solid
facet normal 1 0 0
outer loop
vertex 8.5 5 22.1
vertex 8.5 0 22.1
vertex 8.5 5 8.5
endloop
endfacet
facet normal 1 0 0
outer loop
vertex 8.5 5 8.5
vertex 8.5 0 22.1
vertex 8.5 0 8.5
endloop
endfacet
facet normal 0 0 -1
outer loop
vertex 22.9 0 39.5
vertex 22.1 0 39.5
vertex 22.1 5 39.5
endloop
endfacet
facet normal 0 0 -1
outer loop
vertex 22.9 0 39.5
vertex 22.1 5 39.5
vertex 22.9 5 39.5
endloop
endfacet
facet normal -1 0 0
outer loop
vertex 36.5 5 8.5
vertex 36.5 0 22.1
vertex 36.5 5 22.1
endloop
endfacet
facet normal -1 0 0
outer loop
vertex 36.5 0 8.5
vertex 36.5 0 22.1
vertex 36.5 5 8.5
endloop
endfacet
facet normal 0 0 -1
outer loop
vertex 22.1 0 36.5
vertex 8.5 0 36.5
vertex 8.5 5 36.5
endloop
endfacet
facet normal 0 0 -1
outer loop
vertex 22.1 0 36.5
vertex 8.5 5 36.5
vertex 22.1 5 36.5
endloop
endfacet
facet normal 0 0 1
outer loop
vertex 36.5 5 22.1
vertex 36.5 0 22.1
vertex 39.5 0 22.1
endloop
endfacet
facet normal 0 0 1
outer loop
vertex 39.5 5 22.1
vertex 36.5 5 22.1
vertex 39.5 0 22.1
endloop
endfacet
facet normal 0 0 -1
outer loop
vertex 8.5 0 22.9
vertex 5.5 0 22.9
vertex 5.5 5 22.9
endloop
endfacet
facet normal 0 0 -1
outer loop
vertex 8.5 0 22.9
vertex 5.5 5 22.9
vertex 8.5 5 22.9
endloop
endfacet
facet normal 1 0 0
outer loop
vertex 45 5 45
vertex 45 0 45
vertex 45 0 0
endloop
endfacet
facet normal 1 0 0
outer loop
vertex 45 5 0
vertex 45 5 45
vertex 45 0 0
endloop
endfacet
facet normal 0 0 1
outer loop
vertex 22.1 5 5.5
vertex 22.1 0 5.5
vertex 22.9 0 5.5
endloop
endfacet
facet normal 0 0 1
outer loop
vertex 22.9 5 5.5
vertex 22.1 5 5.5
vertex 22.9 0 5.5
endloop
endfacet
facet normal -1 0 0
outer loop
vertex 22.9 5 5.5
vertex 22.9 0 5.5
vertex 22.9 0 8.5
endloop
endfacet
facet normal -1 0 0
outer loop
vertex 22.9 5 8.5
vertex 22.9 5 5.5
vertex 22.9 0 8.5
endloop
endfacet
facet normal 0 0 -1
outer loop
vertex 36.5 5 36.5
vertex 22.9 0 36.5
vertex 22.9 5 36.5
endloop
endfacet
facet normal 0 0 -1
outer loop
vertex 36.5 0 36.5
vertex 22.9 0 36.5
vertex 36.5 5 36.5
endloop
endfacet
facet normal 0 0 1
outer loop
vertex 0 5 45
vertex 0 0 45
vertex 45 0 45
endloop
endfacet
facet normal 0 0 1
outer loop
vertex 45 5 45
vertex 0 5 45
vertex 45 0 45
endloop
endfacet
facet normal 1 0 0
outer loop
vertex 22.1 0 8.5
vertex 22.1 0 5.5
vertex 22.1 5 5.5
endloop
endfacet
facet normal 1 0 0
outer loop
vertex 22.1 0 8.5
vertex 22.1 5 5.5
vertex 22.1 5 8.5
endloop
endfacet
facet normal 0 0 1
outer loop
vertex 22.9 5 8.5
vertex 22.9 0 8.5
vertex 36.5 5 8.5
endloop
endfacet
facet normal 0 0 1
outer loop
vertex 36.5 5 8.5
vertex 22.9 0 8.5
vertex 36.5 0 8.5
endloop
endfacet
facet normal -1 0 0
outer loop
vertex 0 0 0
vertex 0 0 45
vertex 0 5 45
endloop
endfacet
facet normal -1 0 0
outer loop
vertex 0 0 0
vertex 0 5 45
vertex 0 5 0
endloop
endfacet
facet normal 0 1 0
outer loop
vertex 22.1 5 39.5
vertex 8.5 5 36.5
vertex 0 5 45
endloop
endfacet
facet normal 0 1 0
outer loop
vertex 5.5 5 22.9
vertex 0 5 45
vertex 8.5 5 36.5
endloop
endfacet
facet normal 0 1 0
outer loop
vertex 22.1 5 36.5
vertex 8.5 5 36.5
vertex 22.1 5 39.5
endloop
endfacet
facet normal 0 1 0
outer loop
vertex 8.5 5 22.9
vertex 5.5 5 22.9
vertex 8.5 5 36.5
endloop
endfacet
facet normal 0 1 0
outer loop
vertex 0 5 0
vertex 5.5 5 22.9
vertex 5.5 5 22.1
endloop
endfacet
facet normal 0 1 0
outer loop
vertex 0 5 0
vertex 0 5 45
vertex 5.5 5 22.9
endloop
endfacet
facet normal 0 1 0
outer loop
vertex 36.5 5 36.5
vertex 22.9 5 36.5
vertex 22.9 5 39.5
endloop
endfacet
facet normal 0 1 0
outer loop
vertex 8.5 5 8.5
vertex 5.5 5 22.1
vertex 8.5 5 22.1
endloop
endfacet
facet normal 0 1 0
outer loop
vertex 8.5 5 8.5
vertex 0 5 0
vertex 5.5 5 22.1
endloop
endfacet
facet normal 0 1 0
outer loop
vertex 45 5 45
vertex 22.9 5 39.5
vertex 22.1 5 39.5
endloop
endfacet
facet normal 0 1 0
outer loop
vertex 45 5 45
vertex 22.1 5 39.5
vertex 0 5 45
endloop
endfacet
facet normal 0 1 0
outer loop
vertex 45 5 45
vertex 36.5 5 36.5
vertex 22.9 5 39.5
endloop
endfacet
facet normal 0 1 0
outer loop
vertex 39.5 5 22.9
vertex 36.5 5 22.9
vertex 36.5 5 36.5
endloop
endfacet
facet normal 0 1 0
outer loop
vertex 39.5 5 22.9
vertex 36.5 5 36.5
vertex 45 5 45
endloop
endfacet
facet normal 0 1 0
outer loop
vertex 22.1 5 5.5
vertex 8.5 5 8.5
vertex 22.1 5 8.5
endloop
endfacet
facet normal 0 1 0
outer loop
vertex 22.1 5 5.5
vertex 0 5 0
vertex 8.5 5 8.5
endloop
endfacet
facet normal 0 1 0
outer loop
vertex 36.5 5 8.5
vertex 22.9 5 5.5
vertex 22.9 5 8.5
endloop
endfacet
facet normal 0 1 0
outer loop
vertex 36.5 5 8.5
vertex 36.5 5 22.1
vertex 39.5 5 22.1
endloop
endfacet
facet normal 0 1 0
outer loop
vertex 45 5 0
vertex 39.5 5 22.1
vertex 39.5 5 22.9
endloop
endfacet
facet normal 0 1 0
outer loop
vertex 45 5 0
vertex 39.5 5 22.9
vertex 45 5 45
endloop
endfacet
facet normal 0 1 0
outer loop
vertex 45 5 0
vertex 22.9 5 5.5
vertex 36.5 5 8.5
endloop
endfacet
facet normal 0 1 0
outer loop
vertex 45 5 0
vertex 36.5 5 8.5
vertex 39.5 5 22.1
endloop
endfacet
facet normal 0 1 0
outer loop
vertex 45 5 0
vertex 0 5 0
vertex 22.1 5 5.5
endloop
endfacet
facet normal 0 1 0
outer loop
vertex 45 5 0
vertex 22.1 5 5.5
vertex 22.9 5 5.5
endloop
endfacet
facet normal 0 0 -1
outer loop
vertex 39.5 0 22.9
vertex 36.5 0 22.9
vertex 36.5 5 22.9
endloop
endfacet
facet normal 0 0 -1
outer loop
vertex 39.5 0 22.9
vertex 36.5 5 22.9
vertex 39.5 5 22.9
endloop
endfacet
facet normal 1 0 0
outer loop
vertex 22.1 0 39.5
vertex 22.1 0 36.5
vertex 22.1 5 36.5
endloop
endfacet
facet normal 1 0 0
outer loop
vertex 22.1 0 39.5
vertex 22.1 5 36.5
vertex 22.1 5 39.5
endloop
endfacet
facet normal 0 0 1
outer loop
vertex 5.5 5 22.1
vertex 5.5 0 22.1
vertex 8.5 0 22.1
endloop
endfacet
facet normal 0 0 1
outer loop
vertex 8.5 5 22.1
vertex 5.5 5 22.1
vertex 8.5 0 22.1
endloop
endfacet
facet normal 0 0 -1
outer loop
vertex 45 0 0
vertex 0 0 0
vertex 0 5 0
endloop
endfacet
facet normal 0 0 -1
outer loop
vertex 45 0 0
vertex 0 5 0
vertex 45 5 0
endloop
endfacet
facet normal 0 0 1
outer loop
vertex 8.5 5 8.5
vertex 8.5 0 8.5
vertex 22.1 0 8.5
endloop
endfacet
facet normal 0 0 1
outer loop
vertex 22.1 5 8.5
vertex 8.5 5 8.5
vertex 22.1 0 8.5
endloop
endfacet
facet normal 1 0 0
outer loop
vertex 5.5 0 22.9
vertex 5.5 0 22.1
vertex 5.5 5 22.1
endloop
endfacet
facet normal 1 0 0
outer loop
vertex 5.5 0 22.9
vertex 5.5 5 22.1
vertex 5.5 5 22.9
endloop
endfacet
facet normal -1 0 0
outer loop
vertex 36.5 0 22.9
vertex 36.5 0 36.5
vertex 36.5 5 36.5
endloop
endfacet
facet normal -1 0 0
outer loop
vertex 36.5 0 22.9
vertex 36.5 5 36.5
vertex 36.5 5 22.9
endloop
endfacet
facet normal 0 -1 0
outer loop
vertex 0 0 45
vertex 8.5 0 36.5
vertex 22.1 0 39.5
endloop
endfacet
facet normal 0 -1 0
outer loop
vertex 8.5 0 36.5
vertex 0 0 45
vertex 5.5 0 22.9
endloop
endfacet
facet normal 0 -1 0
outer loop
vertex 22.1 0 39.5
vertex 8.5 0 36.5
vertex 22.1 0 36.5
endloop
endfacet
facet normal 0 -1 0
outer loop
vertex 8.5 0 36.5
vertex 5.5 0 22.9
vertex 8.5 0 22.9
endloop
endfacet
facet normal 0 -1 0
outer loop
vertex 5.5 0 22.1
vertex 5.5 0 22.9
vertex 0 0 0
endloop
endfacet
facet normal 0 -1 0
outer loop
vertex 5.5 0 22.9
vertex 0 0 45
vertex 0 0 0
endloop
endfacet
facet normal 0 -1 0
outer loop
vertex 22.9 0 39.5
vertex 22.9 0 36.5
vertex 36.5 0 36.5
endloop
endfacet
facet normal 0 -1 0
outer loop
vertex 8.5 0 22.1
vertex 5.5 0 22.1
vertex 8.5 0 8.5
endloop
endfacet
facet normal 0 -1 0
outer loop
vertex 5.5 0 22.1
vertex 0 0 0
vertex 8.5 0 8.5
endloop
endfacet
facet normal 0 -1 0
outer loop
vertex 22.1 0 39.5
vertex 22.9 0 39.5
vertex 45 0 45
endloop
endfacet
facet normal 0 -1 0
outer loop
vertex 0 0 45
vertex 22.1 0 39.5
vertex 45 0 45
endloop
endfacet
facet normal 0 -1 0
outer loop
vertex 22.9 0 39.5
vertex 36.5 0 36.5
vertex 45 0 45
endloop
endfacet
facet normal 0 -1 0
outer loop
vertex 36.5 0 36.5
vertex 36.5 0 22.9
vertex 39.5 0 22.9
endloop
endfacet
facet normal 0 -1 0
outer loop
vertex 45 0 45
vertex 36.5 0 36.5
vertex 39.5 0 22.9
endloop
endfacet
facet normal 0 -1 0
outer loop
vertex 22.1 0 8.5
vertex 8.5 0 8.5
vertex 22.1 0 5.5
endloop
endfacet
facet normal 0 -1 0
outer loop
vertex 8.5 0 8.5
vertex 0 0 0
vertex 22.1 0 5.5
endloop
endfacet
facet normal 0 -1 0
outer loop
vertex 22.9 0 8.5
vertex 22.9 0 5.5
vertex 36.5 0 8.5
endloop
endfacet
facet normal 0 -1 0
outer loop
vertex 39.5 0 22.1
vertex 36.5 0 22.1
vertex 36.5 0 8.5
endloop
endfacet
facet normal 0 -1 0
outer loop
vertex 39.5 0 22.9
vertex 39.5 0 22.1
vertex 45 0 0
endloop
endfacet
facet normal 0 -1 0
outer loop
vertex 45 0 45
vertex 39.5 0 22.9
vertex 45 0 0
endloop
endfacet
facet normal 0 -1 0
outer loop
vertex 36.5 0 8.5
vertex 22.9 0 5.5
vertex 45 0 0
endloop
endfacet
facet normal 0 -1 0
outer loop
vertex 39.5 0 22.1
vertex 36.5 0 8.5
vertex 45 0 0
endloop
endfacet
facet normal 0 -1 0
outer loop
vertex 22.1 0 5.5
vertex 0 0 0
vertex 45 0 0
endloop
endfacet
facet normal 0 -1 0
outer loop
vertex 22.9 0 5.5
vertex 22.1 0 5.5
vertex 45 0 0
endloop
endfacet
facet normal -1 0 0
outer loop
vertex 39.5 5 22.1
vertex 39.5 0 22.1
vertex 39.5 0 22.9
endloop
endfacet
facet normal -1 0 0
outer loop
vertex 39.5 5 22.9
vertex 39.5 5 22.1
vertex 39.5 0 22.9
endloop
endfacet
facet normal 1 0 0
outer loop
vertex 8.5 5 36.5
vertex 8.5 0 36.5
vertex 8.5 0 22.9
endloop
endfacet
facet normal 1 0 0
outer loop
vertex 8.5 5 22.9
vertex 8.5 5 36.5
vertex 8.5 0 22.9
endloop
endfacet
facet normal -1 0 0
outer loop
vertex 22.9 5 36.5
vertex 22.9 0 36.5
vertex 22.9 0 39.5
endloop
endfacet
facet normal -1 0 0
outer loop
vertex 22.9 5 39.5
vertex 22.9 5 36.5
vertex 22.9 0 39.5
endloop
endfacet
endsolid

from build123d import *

# Parameters (mm, degrees)
CROQUIS1_W              = 45
CROQUIS1_H              = 45
CROQUIS1_W_2            = 28
CROQUIS1_H_2            = 28
SALIENTE_EXTRUIR1_DEPTH = 5
CROQUIS2_W              = 0.8
CROQUIS2_H              = 3
CROQUIS2_W_2            = 3
CROQUIS2_H_2            = 0.8
CORTAR_EXTRUIR1_DEPTH   = 5


with BuildPart() as part:
    # Croquis1 → Saliente-Extruir1 (new body)
    with BuildSketch(Plane(origin=(0, 0, 0), x_dir=(1, 0, 0), z_dir=(0, 1, 0))):
        with Locations((22.5, -22.5)):
            Rectangle(CROQUIS1_W, CROQUIS1_H)
        with Locations((22.5, -22.5)):
            Rectangle(CROQUIS1_W_2, CROQUIS1_H_2, mode=Mode.SUBTRACT)
    extrude(amount=SALIENTE_EXTRUIR1_DEPTH)

    # Croquis2 → Cortar-Extruir1 (cut)
    with BuildSketch(Plane.XZ):
        with Locations((22.5, 38)):
            Rectangle(CROQUIS2_W, CROQUIS2_H)
        with Locations((38, 22.5)):
            Rectangle(CROQUIS2_W_2, CROQUIS2_H_2)
        with Locations((22.5, 7)):
            Rectangle(CROQUIS2_W, CROQUIS2_H)
        with Locations((7, 22.5)):
            Rectangle(CROQUIS2_W_2, CROQUIS2_H_2)
    extrude(amount=-CORTAR_EXTRUIR1_DEPTH, mode=Mode.SUBTRACT)


solid = part.part
